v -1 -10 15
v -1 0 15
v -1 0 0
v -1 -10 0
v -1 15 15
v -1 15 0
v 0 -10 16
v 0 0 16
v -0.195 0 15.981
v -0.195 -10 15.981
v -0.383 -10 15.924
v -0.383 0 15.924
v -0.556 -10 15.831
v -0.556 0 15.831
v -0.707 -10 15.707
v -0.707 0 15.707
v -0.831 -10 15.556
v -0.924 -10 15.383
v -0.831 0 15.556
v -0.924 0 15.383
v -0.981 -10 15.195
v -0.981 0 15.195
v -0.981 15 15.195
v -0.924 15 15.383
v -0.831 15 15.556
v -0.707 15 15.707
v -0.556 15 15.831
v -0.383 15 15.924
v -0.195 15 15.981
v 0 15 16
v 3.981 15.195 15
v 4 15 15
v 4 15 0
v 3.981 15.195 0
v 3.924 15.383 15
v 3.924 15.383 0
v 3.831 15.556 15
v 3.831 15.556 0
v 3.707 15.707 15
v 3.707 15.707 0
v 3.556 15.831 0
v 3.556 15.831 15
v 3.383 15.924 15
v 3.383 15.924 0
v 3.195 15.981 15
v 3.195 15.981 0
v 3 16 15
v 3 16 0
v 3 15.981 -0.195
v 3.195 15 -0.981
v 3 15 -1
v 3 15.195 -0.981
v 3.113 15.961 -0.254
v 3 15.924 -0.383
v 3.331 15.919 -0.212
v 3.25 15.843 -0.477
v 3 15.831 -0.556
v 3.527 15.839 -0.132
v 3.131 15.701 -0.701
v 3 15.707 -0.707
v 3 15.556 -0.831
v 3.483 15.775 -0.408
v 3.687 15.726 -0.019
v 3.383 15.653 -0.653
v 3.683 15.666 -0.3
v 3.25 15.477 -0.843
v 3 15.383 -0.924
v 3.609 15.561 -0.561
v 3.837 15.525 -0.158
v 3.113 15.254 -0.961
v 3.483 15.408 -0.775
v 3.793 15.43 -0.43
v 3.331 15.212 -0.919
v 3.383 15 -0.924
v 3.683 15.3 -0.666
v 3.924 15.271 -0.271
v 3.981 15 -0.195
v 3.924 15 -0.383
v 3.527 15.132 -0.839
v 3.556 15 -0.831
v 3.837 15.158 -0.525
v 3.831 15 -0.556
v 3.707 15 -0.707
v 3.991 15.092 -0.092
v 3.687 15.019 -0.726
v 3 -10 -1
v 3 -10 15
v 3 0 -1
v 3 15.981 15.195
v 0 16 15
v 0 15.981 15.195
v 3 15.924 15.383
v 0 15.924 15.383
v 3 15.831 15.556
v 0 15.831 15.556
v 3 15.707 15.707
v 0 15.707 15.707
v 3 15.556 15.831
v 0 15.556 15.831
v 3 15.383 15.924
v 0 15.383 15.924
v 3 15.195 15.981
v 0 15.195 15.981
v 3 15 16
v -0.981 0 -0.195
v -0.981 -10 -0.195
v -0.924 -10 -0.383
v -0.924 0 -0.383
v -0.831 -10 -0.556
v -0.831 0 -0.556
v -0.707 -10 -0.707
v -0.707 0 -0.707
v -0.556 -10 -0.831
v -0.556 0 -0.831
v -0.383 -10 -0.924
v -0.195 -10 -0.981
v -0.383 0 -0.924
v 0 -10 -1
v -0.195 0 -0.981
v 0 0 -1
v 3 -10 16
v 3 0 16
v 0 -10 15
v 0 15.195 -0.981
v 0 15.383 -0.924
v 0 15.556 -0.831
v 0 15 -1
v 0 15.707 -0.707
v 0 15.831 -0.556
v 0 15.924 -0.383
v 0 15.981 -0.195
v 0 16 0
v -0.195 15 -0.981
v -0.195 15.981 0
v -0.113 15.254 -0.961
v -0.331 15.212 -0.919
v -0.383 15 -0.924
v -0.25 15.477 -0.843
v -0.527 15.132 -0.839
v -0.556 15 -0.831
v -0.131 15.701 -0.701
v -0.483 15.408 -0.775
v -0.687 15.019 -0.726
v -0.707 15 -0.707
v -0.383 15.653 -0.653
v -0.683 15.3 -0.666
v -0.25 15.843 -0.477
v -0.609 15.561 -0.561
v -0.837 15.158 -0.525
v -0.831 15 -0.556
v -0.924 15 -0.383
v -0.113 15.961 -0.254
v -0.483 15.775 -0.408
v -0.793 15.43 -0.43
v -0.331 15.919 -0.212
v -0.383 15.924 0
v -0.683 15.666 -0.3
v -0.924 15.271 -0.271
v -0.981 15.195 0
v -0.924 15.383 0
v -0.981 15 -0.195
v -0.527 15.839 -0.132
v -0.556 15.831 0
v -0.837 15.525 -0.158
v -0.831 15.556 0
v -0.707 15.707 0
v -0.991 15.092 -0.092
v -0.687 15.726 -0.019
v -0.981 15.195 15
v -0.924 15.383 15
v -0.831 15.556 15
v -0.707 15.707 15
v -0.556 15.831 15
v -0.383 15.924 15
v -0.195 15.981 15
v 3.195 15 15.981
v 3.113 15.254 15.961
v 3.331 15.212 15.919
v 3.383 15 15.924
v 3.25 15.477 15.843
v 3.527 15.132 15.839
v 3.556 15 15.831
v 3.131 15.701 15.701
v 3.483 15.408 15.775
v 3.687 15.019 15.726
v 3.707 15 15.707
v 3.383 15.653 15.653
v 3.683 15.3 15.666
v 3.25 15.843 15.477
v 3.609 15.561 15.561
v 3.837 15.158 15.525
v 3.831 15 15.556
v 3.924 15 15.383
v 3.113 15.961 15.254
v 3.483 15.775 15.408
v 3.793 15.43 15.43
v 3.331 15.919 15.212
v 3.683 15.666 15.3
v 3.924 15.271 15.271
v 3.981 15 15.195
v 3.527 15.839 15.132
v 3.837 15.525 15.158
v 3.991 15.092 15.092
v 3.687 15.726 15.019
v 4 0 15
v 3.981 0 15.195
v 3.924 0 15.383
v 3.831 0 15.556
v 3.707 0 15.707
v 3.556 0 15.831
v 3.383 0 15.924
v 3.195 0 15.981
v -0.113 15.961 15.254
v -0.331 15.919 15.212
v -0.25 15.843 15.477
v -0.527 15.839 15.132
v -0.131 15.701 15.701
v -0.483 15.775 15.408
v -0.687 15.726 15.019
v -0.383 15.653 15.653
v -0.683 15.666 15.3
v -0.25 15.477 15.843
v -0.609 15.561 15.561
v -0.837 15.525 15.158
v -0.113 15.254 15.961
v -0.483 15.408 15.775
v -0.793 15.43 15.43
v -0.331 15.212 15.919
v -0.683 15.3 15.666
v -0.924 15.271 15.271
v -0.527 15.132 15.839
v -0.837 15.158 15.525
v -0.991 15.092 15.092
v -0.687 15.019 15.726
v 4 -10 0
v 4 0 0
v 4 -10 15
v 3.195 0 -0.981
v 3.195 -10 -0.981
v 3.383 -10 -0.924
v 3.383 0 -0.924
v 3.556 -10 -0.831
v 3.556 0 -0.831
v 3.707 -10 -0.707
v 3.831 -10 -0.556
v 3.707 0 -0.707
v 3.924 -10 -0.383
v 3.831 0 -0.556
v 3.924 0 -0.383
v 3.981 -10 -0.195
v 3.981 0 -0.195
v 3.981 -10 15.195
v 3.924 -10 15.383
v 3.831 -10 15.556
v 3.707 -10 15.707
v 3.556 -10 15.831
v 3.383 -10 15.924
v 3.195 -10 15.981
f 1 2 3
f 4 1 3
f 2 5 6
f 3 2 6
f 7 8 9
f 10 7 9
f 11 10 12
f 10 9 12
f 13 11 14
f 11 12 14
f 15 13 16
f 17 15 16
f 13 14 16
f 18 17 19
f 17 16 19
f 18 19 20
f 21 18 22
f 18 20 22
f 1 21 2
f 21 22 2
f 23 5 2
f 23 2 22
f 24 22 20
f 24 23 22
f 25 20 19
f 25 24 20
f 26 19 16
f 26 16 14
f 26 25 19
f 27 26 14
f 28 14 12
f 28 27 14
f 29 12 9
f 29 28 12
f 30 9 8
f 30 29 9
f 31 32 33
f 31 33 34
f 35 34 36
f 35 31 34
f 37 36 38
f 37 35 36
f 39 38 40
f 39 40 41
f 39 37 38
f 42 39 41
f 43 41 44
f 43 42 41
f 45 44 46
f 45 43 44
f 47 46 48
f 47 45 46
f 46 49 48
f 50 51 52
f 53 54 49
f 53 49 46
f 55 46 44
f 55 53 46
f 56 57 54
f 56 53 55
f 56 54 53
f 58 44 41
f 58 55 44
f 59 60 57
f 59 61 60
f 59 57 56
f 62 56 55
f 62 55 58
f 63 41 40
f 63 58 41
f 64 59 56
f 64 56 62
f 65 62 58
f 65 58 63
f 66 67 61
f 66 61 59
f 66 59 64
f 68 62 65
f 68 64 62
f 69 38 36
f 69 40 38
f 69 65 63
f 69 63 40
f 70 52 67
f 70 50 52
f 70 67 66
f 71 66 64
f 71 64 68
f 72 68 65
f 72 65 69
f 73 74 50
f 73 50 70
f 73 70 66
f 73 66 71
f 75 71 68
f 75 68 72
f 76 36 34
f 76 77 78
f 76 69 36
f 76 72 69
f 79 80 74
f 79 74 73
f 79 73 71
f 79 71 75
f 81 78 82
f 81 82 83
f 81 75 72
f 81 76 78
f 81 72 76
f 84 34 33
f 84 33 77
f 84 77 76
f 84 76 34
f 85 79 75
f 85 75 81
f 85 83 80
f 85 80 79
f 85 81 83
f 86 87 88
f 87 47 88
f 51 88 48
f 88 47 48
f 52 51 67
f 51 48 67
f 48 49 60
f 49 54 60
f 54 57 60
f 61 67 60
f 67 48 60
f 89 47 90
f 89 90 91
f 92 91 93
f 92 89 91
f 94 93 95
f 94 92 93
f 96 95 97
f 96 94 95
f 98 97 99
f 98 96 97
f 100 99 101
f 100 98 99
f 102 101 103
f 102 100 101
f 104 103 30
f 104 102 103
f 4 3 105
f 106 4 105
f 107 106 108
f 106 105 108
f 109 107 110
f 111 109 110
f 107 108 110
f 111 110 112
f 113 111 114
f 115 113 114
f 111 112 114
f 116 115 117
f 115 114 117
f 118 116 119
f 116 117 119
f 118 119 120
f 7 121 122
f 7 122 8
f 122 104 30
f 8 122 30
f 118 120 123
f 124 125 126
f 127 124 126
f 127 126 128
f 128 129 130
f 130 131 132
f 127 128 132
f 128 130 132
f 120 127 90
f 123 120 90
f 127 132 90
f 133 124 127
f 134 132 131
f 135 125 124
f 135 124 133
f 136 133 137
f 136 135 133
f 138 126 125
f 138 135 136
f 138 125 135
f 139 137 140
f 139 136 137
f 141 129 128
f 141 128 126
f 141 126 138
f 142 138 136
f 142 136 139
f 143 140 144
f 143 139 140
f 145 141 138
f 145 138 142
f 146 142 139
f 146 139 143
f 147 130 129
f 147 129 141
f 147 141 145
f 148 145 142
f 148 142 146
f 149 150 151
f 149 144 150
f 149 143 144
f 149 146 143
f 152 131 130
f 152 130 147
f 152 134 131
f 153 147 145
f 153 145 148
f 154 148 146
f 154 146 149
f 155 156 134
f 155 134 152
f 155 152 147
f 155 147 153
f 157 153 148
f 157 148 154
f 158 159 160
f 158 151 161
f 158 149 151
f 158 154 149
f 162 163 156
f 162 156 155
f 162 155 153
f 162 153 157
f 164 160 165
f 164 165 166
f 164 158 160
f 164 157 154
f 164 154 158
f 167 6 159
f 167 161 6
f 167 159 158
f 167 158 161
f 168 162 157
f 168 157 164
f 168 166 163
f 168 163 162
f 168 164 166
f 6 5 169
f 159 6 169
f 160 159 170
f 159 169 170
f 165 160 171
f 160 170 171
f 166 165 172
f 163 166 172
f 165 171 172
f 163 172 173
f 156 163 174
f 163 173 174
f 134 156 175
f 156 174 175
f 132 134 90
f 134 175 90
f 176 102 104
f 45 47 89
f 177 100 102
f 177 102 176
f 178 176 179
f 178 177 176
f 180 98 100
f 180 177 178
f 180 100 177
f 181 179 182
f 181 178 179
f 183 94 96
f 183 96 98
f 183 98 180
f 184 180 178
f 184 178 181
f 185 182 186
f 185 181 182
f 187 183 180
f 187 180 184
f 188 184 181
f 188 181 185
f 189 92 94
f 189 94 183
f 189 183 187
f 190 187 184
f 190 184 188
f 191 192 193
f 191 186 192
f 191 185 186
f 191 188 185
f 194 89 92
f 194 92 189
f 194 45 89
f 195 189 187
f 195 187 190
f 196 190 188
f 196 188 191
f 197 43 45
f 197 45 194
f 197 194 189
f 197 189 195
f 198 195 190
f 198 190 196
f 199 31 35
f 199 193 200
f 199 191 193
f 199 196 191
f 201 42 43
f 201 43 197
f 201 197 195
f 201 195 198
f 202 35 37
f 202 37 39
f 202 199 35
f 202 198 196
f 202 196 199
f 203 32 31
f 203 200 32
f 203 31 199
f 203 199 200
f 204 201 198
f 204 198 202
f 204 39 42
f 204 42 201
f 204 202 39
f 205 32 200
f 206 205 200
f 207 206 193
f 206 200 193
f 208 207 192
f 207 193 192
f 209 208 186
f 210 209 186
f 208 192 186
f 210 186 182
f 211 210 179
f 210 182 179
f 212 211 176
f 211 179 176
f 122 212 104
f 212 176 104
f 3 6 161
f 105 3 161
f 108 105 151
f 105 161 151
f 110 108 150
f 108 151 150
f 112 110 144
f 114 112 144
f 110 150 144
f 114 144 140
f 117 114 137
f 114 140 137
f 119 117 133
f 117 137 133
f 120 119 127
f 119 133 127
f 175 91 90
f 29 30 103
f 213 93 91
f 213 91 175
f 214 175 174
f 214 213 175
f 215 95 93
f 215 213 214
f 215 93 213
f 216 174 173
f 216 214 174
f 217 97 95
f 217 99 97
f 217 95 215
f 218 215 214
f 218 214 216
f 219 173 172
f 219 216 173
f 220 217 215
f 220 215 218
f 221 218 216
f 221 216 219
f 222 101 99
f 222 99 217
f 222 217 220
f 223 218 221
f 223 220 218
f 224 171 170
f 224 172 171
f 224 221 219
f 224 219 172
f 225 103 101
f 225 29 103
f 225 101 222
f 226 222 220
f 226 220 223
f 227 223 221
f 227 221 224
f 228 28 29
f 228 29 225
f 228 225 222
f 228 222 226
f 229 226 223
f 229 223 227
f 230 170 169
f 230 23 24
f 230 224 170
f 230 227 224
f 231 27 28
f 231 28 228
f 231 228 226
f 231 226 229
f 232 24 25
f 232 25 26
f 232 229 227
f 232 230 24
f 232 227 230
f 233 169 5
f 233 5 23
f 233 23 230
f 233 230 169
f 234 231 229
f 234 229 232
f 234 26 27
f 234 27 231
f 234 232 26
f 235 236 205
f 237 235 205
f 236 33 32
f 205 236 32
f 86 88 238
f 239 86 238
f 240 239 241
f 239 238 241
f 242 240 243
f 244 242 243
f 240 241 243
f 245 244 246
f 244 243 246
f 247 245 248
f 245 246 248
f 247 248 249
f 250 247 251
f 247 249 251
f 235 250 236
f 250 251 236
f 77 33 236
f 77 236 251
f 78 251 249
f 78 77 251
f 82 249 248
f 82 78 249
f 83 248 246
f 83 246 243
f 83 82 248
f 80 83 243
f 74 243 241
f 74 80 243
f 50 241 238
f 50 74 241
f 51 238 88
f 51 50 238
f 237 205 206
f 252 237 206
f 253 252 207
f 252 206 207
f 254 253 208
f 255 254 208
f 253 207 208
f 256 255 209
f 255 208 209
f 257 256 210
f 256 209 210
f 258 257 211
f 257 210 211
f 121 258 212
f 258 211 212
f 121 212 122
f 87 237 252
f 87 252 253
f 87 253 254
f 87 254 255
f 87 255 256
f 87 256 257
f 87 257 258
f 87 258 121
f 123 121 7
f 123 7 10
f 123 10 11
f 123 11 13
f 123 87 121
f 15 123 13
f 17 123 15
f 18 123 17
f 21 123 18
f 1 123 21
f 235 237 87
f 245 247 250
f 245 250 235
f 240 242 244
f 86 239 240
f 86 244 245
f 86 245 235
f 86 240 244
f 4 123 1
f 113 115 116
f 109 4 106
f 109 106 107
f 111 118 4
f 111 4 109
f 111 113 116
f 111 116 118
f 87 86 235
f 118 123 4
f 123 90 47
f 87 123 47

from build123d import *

# Parameters (mm, degrees)
SKETCH_W           = 3
SKETCH_H           = 15
PAD_DEPTH          = 15
THICKNESS_T        = 1
THICKNESS_FACE2_W  = 3
THICKNESS_FACE2_H  = 15
POCKET_DEPTH       = 5
POCKET_FACE4_W     = 15
POCKET_FACE4_H     = 3
POCKET001_DEPTH    = 5
POCKET001_FACE18_W = 3
POCKET001_FACE18_H = 1
POCKET002_DEPTH    = 5
PAD001_DEPTH       = 10


with BuildPart() as part:
    # Sketch → Pad (new body)
    with BuildSketch(Plane.XY):
        with Locations((1.5, 7.5)):
            Rectangle(SKETCH_W, SKETCH_H)
    extrude(amount=PAD_DEPTH)

    # Thickness
    thickness_openings = [part.faces().sort_by_distance(p)[0] for p in [
        (1.5, 0, 7.5),
    ]]
    offset(amount=THICKNESS_T, openings=thickness_openings)

    # Thickness Face2 → Pocket (cut)
    with BuildSketch(Plane(origin=(1.5, 15, 7.5), x_dir=(-1, 0, 0), z_dir=(0, -1, 0))):
        Rectangle(THICKNESS_FACE2_W, THICKNESS_FACE2_H)
    extrude(amount=-POCKET_DEPTH, mode=Mode.SUBTRACT)

    # Pocket Face4 → Pocket001 (cut)
    with BuildSketch(Plane(origin=(1.5, 7.5, 0), x_dir=(0, 1, 0), z_dir=(0, 0, 1))):
        Rectangle(POCKET_FACE4_W, POCKET_FACE4_H)
    extrude(amount=-POCKET001_DEPTH, mode=Mode.SUBTRACT)

    # Pocket001 Face18 → Pocket002 (cut)
    with BuildSketch(Plane(origin=(1.5, 15, -0.5), x_dir=(-1, 0, 0), z_dir=(0, -1, 0))):
        Rectangle(POCKET001_FACE18_W, POCKET001_FACE18_H)
    extrude(amount=-POCKET002_DEPTH, mode=Mode.SUBTRACT)

    # Pocket002 Face2 → Pad001 (add)
    with BuildSketch(Plane(origin=(1.5, 0, 8.164055), x_dir=(-1, 0, 0), z_dir=(0, -1, 0))):
        with BuildLine():
            Line((1.5, 8.164055), (1.5, -6.835945))
            Line((1.5, -6.835945), (-1.5, -6.835945))
            Line((-1.5, -6.835945), (-1.5, 8.164055))
            Line((-1.5, 8.164055), (-1.5, 9.164055))
            ThreePointArc((-1.5, 9.164055), (-2.207107, 8.871162), (-2.5, 8.164055))
            Line((-2.5, 8.164055), (-2.5, -6.835945))
            ThreePointArc((-2.5, -6.835945), (-2.207107, -7.543052), (-1.5, -7.835945))
            Line((-1.5, -7.835945), (1.5, -7.835945))
            ThreePointArc((1.5, -7.835945), (2.207107, -7.543052), (2.5, -6.835945))
            Line((2.5, -6.835945), (2.5, 8.164055))
            ThreePointArc((2.5, 8.164055), (2.207107, 8.871162), (1.5, 9.164055))
            Line((1.5, 9.164055), (1.5, 8.164055))
        make_face()
    extrude(amount=PAD001_DEPTH)


solid = part.part
